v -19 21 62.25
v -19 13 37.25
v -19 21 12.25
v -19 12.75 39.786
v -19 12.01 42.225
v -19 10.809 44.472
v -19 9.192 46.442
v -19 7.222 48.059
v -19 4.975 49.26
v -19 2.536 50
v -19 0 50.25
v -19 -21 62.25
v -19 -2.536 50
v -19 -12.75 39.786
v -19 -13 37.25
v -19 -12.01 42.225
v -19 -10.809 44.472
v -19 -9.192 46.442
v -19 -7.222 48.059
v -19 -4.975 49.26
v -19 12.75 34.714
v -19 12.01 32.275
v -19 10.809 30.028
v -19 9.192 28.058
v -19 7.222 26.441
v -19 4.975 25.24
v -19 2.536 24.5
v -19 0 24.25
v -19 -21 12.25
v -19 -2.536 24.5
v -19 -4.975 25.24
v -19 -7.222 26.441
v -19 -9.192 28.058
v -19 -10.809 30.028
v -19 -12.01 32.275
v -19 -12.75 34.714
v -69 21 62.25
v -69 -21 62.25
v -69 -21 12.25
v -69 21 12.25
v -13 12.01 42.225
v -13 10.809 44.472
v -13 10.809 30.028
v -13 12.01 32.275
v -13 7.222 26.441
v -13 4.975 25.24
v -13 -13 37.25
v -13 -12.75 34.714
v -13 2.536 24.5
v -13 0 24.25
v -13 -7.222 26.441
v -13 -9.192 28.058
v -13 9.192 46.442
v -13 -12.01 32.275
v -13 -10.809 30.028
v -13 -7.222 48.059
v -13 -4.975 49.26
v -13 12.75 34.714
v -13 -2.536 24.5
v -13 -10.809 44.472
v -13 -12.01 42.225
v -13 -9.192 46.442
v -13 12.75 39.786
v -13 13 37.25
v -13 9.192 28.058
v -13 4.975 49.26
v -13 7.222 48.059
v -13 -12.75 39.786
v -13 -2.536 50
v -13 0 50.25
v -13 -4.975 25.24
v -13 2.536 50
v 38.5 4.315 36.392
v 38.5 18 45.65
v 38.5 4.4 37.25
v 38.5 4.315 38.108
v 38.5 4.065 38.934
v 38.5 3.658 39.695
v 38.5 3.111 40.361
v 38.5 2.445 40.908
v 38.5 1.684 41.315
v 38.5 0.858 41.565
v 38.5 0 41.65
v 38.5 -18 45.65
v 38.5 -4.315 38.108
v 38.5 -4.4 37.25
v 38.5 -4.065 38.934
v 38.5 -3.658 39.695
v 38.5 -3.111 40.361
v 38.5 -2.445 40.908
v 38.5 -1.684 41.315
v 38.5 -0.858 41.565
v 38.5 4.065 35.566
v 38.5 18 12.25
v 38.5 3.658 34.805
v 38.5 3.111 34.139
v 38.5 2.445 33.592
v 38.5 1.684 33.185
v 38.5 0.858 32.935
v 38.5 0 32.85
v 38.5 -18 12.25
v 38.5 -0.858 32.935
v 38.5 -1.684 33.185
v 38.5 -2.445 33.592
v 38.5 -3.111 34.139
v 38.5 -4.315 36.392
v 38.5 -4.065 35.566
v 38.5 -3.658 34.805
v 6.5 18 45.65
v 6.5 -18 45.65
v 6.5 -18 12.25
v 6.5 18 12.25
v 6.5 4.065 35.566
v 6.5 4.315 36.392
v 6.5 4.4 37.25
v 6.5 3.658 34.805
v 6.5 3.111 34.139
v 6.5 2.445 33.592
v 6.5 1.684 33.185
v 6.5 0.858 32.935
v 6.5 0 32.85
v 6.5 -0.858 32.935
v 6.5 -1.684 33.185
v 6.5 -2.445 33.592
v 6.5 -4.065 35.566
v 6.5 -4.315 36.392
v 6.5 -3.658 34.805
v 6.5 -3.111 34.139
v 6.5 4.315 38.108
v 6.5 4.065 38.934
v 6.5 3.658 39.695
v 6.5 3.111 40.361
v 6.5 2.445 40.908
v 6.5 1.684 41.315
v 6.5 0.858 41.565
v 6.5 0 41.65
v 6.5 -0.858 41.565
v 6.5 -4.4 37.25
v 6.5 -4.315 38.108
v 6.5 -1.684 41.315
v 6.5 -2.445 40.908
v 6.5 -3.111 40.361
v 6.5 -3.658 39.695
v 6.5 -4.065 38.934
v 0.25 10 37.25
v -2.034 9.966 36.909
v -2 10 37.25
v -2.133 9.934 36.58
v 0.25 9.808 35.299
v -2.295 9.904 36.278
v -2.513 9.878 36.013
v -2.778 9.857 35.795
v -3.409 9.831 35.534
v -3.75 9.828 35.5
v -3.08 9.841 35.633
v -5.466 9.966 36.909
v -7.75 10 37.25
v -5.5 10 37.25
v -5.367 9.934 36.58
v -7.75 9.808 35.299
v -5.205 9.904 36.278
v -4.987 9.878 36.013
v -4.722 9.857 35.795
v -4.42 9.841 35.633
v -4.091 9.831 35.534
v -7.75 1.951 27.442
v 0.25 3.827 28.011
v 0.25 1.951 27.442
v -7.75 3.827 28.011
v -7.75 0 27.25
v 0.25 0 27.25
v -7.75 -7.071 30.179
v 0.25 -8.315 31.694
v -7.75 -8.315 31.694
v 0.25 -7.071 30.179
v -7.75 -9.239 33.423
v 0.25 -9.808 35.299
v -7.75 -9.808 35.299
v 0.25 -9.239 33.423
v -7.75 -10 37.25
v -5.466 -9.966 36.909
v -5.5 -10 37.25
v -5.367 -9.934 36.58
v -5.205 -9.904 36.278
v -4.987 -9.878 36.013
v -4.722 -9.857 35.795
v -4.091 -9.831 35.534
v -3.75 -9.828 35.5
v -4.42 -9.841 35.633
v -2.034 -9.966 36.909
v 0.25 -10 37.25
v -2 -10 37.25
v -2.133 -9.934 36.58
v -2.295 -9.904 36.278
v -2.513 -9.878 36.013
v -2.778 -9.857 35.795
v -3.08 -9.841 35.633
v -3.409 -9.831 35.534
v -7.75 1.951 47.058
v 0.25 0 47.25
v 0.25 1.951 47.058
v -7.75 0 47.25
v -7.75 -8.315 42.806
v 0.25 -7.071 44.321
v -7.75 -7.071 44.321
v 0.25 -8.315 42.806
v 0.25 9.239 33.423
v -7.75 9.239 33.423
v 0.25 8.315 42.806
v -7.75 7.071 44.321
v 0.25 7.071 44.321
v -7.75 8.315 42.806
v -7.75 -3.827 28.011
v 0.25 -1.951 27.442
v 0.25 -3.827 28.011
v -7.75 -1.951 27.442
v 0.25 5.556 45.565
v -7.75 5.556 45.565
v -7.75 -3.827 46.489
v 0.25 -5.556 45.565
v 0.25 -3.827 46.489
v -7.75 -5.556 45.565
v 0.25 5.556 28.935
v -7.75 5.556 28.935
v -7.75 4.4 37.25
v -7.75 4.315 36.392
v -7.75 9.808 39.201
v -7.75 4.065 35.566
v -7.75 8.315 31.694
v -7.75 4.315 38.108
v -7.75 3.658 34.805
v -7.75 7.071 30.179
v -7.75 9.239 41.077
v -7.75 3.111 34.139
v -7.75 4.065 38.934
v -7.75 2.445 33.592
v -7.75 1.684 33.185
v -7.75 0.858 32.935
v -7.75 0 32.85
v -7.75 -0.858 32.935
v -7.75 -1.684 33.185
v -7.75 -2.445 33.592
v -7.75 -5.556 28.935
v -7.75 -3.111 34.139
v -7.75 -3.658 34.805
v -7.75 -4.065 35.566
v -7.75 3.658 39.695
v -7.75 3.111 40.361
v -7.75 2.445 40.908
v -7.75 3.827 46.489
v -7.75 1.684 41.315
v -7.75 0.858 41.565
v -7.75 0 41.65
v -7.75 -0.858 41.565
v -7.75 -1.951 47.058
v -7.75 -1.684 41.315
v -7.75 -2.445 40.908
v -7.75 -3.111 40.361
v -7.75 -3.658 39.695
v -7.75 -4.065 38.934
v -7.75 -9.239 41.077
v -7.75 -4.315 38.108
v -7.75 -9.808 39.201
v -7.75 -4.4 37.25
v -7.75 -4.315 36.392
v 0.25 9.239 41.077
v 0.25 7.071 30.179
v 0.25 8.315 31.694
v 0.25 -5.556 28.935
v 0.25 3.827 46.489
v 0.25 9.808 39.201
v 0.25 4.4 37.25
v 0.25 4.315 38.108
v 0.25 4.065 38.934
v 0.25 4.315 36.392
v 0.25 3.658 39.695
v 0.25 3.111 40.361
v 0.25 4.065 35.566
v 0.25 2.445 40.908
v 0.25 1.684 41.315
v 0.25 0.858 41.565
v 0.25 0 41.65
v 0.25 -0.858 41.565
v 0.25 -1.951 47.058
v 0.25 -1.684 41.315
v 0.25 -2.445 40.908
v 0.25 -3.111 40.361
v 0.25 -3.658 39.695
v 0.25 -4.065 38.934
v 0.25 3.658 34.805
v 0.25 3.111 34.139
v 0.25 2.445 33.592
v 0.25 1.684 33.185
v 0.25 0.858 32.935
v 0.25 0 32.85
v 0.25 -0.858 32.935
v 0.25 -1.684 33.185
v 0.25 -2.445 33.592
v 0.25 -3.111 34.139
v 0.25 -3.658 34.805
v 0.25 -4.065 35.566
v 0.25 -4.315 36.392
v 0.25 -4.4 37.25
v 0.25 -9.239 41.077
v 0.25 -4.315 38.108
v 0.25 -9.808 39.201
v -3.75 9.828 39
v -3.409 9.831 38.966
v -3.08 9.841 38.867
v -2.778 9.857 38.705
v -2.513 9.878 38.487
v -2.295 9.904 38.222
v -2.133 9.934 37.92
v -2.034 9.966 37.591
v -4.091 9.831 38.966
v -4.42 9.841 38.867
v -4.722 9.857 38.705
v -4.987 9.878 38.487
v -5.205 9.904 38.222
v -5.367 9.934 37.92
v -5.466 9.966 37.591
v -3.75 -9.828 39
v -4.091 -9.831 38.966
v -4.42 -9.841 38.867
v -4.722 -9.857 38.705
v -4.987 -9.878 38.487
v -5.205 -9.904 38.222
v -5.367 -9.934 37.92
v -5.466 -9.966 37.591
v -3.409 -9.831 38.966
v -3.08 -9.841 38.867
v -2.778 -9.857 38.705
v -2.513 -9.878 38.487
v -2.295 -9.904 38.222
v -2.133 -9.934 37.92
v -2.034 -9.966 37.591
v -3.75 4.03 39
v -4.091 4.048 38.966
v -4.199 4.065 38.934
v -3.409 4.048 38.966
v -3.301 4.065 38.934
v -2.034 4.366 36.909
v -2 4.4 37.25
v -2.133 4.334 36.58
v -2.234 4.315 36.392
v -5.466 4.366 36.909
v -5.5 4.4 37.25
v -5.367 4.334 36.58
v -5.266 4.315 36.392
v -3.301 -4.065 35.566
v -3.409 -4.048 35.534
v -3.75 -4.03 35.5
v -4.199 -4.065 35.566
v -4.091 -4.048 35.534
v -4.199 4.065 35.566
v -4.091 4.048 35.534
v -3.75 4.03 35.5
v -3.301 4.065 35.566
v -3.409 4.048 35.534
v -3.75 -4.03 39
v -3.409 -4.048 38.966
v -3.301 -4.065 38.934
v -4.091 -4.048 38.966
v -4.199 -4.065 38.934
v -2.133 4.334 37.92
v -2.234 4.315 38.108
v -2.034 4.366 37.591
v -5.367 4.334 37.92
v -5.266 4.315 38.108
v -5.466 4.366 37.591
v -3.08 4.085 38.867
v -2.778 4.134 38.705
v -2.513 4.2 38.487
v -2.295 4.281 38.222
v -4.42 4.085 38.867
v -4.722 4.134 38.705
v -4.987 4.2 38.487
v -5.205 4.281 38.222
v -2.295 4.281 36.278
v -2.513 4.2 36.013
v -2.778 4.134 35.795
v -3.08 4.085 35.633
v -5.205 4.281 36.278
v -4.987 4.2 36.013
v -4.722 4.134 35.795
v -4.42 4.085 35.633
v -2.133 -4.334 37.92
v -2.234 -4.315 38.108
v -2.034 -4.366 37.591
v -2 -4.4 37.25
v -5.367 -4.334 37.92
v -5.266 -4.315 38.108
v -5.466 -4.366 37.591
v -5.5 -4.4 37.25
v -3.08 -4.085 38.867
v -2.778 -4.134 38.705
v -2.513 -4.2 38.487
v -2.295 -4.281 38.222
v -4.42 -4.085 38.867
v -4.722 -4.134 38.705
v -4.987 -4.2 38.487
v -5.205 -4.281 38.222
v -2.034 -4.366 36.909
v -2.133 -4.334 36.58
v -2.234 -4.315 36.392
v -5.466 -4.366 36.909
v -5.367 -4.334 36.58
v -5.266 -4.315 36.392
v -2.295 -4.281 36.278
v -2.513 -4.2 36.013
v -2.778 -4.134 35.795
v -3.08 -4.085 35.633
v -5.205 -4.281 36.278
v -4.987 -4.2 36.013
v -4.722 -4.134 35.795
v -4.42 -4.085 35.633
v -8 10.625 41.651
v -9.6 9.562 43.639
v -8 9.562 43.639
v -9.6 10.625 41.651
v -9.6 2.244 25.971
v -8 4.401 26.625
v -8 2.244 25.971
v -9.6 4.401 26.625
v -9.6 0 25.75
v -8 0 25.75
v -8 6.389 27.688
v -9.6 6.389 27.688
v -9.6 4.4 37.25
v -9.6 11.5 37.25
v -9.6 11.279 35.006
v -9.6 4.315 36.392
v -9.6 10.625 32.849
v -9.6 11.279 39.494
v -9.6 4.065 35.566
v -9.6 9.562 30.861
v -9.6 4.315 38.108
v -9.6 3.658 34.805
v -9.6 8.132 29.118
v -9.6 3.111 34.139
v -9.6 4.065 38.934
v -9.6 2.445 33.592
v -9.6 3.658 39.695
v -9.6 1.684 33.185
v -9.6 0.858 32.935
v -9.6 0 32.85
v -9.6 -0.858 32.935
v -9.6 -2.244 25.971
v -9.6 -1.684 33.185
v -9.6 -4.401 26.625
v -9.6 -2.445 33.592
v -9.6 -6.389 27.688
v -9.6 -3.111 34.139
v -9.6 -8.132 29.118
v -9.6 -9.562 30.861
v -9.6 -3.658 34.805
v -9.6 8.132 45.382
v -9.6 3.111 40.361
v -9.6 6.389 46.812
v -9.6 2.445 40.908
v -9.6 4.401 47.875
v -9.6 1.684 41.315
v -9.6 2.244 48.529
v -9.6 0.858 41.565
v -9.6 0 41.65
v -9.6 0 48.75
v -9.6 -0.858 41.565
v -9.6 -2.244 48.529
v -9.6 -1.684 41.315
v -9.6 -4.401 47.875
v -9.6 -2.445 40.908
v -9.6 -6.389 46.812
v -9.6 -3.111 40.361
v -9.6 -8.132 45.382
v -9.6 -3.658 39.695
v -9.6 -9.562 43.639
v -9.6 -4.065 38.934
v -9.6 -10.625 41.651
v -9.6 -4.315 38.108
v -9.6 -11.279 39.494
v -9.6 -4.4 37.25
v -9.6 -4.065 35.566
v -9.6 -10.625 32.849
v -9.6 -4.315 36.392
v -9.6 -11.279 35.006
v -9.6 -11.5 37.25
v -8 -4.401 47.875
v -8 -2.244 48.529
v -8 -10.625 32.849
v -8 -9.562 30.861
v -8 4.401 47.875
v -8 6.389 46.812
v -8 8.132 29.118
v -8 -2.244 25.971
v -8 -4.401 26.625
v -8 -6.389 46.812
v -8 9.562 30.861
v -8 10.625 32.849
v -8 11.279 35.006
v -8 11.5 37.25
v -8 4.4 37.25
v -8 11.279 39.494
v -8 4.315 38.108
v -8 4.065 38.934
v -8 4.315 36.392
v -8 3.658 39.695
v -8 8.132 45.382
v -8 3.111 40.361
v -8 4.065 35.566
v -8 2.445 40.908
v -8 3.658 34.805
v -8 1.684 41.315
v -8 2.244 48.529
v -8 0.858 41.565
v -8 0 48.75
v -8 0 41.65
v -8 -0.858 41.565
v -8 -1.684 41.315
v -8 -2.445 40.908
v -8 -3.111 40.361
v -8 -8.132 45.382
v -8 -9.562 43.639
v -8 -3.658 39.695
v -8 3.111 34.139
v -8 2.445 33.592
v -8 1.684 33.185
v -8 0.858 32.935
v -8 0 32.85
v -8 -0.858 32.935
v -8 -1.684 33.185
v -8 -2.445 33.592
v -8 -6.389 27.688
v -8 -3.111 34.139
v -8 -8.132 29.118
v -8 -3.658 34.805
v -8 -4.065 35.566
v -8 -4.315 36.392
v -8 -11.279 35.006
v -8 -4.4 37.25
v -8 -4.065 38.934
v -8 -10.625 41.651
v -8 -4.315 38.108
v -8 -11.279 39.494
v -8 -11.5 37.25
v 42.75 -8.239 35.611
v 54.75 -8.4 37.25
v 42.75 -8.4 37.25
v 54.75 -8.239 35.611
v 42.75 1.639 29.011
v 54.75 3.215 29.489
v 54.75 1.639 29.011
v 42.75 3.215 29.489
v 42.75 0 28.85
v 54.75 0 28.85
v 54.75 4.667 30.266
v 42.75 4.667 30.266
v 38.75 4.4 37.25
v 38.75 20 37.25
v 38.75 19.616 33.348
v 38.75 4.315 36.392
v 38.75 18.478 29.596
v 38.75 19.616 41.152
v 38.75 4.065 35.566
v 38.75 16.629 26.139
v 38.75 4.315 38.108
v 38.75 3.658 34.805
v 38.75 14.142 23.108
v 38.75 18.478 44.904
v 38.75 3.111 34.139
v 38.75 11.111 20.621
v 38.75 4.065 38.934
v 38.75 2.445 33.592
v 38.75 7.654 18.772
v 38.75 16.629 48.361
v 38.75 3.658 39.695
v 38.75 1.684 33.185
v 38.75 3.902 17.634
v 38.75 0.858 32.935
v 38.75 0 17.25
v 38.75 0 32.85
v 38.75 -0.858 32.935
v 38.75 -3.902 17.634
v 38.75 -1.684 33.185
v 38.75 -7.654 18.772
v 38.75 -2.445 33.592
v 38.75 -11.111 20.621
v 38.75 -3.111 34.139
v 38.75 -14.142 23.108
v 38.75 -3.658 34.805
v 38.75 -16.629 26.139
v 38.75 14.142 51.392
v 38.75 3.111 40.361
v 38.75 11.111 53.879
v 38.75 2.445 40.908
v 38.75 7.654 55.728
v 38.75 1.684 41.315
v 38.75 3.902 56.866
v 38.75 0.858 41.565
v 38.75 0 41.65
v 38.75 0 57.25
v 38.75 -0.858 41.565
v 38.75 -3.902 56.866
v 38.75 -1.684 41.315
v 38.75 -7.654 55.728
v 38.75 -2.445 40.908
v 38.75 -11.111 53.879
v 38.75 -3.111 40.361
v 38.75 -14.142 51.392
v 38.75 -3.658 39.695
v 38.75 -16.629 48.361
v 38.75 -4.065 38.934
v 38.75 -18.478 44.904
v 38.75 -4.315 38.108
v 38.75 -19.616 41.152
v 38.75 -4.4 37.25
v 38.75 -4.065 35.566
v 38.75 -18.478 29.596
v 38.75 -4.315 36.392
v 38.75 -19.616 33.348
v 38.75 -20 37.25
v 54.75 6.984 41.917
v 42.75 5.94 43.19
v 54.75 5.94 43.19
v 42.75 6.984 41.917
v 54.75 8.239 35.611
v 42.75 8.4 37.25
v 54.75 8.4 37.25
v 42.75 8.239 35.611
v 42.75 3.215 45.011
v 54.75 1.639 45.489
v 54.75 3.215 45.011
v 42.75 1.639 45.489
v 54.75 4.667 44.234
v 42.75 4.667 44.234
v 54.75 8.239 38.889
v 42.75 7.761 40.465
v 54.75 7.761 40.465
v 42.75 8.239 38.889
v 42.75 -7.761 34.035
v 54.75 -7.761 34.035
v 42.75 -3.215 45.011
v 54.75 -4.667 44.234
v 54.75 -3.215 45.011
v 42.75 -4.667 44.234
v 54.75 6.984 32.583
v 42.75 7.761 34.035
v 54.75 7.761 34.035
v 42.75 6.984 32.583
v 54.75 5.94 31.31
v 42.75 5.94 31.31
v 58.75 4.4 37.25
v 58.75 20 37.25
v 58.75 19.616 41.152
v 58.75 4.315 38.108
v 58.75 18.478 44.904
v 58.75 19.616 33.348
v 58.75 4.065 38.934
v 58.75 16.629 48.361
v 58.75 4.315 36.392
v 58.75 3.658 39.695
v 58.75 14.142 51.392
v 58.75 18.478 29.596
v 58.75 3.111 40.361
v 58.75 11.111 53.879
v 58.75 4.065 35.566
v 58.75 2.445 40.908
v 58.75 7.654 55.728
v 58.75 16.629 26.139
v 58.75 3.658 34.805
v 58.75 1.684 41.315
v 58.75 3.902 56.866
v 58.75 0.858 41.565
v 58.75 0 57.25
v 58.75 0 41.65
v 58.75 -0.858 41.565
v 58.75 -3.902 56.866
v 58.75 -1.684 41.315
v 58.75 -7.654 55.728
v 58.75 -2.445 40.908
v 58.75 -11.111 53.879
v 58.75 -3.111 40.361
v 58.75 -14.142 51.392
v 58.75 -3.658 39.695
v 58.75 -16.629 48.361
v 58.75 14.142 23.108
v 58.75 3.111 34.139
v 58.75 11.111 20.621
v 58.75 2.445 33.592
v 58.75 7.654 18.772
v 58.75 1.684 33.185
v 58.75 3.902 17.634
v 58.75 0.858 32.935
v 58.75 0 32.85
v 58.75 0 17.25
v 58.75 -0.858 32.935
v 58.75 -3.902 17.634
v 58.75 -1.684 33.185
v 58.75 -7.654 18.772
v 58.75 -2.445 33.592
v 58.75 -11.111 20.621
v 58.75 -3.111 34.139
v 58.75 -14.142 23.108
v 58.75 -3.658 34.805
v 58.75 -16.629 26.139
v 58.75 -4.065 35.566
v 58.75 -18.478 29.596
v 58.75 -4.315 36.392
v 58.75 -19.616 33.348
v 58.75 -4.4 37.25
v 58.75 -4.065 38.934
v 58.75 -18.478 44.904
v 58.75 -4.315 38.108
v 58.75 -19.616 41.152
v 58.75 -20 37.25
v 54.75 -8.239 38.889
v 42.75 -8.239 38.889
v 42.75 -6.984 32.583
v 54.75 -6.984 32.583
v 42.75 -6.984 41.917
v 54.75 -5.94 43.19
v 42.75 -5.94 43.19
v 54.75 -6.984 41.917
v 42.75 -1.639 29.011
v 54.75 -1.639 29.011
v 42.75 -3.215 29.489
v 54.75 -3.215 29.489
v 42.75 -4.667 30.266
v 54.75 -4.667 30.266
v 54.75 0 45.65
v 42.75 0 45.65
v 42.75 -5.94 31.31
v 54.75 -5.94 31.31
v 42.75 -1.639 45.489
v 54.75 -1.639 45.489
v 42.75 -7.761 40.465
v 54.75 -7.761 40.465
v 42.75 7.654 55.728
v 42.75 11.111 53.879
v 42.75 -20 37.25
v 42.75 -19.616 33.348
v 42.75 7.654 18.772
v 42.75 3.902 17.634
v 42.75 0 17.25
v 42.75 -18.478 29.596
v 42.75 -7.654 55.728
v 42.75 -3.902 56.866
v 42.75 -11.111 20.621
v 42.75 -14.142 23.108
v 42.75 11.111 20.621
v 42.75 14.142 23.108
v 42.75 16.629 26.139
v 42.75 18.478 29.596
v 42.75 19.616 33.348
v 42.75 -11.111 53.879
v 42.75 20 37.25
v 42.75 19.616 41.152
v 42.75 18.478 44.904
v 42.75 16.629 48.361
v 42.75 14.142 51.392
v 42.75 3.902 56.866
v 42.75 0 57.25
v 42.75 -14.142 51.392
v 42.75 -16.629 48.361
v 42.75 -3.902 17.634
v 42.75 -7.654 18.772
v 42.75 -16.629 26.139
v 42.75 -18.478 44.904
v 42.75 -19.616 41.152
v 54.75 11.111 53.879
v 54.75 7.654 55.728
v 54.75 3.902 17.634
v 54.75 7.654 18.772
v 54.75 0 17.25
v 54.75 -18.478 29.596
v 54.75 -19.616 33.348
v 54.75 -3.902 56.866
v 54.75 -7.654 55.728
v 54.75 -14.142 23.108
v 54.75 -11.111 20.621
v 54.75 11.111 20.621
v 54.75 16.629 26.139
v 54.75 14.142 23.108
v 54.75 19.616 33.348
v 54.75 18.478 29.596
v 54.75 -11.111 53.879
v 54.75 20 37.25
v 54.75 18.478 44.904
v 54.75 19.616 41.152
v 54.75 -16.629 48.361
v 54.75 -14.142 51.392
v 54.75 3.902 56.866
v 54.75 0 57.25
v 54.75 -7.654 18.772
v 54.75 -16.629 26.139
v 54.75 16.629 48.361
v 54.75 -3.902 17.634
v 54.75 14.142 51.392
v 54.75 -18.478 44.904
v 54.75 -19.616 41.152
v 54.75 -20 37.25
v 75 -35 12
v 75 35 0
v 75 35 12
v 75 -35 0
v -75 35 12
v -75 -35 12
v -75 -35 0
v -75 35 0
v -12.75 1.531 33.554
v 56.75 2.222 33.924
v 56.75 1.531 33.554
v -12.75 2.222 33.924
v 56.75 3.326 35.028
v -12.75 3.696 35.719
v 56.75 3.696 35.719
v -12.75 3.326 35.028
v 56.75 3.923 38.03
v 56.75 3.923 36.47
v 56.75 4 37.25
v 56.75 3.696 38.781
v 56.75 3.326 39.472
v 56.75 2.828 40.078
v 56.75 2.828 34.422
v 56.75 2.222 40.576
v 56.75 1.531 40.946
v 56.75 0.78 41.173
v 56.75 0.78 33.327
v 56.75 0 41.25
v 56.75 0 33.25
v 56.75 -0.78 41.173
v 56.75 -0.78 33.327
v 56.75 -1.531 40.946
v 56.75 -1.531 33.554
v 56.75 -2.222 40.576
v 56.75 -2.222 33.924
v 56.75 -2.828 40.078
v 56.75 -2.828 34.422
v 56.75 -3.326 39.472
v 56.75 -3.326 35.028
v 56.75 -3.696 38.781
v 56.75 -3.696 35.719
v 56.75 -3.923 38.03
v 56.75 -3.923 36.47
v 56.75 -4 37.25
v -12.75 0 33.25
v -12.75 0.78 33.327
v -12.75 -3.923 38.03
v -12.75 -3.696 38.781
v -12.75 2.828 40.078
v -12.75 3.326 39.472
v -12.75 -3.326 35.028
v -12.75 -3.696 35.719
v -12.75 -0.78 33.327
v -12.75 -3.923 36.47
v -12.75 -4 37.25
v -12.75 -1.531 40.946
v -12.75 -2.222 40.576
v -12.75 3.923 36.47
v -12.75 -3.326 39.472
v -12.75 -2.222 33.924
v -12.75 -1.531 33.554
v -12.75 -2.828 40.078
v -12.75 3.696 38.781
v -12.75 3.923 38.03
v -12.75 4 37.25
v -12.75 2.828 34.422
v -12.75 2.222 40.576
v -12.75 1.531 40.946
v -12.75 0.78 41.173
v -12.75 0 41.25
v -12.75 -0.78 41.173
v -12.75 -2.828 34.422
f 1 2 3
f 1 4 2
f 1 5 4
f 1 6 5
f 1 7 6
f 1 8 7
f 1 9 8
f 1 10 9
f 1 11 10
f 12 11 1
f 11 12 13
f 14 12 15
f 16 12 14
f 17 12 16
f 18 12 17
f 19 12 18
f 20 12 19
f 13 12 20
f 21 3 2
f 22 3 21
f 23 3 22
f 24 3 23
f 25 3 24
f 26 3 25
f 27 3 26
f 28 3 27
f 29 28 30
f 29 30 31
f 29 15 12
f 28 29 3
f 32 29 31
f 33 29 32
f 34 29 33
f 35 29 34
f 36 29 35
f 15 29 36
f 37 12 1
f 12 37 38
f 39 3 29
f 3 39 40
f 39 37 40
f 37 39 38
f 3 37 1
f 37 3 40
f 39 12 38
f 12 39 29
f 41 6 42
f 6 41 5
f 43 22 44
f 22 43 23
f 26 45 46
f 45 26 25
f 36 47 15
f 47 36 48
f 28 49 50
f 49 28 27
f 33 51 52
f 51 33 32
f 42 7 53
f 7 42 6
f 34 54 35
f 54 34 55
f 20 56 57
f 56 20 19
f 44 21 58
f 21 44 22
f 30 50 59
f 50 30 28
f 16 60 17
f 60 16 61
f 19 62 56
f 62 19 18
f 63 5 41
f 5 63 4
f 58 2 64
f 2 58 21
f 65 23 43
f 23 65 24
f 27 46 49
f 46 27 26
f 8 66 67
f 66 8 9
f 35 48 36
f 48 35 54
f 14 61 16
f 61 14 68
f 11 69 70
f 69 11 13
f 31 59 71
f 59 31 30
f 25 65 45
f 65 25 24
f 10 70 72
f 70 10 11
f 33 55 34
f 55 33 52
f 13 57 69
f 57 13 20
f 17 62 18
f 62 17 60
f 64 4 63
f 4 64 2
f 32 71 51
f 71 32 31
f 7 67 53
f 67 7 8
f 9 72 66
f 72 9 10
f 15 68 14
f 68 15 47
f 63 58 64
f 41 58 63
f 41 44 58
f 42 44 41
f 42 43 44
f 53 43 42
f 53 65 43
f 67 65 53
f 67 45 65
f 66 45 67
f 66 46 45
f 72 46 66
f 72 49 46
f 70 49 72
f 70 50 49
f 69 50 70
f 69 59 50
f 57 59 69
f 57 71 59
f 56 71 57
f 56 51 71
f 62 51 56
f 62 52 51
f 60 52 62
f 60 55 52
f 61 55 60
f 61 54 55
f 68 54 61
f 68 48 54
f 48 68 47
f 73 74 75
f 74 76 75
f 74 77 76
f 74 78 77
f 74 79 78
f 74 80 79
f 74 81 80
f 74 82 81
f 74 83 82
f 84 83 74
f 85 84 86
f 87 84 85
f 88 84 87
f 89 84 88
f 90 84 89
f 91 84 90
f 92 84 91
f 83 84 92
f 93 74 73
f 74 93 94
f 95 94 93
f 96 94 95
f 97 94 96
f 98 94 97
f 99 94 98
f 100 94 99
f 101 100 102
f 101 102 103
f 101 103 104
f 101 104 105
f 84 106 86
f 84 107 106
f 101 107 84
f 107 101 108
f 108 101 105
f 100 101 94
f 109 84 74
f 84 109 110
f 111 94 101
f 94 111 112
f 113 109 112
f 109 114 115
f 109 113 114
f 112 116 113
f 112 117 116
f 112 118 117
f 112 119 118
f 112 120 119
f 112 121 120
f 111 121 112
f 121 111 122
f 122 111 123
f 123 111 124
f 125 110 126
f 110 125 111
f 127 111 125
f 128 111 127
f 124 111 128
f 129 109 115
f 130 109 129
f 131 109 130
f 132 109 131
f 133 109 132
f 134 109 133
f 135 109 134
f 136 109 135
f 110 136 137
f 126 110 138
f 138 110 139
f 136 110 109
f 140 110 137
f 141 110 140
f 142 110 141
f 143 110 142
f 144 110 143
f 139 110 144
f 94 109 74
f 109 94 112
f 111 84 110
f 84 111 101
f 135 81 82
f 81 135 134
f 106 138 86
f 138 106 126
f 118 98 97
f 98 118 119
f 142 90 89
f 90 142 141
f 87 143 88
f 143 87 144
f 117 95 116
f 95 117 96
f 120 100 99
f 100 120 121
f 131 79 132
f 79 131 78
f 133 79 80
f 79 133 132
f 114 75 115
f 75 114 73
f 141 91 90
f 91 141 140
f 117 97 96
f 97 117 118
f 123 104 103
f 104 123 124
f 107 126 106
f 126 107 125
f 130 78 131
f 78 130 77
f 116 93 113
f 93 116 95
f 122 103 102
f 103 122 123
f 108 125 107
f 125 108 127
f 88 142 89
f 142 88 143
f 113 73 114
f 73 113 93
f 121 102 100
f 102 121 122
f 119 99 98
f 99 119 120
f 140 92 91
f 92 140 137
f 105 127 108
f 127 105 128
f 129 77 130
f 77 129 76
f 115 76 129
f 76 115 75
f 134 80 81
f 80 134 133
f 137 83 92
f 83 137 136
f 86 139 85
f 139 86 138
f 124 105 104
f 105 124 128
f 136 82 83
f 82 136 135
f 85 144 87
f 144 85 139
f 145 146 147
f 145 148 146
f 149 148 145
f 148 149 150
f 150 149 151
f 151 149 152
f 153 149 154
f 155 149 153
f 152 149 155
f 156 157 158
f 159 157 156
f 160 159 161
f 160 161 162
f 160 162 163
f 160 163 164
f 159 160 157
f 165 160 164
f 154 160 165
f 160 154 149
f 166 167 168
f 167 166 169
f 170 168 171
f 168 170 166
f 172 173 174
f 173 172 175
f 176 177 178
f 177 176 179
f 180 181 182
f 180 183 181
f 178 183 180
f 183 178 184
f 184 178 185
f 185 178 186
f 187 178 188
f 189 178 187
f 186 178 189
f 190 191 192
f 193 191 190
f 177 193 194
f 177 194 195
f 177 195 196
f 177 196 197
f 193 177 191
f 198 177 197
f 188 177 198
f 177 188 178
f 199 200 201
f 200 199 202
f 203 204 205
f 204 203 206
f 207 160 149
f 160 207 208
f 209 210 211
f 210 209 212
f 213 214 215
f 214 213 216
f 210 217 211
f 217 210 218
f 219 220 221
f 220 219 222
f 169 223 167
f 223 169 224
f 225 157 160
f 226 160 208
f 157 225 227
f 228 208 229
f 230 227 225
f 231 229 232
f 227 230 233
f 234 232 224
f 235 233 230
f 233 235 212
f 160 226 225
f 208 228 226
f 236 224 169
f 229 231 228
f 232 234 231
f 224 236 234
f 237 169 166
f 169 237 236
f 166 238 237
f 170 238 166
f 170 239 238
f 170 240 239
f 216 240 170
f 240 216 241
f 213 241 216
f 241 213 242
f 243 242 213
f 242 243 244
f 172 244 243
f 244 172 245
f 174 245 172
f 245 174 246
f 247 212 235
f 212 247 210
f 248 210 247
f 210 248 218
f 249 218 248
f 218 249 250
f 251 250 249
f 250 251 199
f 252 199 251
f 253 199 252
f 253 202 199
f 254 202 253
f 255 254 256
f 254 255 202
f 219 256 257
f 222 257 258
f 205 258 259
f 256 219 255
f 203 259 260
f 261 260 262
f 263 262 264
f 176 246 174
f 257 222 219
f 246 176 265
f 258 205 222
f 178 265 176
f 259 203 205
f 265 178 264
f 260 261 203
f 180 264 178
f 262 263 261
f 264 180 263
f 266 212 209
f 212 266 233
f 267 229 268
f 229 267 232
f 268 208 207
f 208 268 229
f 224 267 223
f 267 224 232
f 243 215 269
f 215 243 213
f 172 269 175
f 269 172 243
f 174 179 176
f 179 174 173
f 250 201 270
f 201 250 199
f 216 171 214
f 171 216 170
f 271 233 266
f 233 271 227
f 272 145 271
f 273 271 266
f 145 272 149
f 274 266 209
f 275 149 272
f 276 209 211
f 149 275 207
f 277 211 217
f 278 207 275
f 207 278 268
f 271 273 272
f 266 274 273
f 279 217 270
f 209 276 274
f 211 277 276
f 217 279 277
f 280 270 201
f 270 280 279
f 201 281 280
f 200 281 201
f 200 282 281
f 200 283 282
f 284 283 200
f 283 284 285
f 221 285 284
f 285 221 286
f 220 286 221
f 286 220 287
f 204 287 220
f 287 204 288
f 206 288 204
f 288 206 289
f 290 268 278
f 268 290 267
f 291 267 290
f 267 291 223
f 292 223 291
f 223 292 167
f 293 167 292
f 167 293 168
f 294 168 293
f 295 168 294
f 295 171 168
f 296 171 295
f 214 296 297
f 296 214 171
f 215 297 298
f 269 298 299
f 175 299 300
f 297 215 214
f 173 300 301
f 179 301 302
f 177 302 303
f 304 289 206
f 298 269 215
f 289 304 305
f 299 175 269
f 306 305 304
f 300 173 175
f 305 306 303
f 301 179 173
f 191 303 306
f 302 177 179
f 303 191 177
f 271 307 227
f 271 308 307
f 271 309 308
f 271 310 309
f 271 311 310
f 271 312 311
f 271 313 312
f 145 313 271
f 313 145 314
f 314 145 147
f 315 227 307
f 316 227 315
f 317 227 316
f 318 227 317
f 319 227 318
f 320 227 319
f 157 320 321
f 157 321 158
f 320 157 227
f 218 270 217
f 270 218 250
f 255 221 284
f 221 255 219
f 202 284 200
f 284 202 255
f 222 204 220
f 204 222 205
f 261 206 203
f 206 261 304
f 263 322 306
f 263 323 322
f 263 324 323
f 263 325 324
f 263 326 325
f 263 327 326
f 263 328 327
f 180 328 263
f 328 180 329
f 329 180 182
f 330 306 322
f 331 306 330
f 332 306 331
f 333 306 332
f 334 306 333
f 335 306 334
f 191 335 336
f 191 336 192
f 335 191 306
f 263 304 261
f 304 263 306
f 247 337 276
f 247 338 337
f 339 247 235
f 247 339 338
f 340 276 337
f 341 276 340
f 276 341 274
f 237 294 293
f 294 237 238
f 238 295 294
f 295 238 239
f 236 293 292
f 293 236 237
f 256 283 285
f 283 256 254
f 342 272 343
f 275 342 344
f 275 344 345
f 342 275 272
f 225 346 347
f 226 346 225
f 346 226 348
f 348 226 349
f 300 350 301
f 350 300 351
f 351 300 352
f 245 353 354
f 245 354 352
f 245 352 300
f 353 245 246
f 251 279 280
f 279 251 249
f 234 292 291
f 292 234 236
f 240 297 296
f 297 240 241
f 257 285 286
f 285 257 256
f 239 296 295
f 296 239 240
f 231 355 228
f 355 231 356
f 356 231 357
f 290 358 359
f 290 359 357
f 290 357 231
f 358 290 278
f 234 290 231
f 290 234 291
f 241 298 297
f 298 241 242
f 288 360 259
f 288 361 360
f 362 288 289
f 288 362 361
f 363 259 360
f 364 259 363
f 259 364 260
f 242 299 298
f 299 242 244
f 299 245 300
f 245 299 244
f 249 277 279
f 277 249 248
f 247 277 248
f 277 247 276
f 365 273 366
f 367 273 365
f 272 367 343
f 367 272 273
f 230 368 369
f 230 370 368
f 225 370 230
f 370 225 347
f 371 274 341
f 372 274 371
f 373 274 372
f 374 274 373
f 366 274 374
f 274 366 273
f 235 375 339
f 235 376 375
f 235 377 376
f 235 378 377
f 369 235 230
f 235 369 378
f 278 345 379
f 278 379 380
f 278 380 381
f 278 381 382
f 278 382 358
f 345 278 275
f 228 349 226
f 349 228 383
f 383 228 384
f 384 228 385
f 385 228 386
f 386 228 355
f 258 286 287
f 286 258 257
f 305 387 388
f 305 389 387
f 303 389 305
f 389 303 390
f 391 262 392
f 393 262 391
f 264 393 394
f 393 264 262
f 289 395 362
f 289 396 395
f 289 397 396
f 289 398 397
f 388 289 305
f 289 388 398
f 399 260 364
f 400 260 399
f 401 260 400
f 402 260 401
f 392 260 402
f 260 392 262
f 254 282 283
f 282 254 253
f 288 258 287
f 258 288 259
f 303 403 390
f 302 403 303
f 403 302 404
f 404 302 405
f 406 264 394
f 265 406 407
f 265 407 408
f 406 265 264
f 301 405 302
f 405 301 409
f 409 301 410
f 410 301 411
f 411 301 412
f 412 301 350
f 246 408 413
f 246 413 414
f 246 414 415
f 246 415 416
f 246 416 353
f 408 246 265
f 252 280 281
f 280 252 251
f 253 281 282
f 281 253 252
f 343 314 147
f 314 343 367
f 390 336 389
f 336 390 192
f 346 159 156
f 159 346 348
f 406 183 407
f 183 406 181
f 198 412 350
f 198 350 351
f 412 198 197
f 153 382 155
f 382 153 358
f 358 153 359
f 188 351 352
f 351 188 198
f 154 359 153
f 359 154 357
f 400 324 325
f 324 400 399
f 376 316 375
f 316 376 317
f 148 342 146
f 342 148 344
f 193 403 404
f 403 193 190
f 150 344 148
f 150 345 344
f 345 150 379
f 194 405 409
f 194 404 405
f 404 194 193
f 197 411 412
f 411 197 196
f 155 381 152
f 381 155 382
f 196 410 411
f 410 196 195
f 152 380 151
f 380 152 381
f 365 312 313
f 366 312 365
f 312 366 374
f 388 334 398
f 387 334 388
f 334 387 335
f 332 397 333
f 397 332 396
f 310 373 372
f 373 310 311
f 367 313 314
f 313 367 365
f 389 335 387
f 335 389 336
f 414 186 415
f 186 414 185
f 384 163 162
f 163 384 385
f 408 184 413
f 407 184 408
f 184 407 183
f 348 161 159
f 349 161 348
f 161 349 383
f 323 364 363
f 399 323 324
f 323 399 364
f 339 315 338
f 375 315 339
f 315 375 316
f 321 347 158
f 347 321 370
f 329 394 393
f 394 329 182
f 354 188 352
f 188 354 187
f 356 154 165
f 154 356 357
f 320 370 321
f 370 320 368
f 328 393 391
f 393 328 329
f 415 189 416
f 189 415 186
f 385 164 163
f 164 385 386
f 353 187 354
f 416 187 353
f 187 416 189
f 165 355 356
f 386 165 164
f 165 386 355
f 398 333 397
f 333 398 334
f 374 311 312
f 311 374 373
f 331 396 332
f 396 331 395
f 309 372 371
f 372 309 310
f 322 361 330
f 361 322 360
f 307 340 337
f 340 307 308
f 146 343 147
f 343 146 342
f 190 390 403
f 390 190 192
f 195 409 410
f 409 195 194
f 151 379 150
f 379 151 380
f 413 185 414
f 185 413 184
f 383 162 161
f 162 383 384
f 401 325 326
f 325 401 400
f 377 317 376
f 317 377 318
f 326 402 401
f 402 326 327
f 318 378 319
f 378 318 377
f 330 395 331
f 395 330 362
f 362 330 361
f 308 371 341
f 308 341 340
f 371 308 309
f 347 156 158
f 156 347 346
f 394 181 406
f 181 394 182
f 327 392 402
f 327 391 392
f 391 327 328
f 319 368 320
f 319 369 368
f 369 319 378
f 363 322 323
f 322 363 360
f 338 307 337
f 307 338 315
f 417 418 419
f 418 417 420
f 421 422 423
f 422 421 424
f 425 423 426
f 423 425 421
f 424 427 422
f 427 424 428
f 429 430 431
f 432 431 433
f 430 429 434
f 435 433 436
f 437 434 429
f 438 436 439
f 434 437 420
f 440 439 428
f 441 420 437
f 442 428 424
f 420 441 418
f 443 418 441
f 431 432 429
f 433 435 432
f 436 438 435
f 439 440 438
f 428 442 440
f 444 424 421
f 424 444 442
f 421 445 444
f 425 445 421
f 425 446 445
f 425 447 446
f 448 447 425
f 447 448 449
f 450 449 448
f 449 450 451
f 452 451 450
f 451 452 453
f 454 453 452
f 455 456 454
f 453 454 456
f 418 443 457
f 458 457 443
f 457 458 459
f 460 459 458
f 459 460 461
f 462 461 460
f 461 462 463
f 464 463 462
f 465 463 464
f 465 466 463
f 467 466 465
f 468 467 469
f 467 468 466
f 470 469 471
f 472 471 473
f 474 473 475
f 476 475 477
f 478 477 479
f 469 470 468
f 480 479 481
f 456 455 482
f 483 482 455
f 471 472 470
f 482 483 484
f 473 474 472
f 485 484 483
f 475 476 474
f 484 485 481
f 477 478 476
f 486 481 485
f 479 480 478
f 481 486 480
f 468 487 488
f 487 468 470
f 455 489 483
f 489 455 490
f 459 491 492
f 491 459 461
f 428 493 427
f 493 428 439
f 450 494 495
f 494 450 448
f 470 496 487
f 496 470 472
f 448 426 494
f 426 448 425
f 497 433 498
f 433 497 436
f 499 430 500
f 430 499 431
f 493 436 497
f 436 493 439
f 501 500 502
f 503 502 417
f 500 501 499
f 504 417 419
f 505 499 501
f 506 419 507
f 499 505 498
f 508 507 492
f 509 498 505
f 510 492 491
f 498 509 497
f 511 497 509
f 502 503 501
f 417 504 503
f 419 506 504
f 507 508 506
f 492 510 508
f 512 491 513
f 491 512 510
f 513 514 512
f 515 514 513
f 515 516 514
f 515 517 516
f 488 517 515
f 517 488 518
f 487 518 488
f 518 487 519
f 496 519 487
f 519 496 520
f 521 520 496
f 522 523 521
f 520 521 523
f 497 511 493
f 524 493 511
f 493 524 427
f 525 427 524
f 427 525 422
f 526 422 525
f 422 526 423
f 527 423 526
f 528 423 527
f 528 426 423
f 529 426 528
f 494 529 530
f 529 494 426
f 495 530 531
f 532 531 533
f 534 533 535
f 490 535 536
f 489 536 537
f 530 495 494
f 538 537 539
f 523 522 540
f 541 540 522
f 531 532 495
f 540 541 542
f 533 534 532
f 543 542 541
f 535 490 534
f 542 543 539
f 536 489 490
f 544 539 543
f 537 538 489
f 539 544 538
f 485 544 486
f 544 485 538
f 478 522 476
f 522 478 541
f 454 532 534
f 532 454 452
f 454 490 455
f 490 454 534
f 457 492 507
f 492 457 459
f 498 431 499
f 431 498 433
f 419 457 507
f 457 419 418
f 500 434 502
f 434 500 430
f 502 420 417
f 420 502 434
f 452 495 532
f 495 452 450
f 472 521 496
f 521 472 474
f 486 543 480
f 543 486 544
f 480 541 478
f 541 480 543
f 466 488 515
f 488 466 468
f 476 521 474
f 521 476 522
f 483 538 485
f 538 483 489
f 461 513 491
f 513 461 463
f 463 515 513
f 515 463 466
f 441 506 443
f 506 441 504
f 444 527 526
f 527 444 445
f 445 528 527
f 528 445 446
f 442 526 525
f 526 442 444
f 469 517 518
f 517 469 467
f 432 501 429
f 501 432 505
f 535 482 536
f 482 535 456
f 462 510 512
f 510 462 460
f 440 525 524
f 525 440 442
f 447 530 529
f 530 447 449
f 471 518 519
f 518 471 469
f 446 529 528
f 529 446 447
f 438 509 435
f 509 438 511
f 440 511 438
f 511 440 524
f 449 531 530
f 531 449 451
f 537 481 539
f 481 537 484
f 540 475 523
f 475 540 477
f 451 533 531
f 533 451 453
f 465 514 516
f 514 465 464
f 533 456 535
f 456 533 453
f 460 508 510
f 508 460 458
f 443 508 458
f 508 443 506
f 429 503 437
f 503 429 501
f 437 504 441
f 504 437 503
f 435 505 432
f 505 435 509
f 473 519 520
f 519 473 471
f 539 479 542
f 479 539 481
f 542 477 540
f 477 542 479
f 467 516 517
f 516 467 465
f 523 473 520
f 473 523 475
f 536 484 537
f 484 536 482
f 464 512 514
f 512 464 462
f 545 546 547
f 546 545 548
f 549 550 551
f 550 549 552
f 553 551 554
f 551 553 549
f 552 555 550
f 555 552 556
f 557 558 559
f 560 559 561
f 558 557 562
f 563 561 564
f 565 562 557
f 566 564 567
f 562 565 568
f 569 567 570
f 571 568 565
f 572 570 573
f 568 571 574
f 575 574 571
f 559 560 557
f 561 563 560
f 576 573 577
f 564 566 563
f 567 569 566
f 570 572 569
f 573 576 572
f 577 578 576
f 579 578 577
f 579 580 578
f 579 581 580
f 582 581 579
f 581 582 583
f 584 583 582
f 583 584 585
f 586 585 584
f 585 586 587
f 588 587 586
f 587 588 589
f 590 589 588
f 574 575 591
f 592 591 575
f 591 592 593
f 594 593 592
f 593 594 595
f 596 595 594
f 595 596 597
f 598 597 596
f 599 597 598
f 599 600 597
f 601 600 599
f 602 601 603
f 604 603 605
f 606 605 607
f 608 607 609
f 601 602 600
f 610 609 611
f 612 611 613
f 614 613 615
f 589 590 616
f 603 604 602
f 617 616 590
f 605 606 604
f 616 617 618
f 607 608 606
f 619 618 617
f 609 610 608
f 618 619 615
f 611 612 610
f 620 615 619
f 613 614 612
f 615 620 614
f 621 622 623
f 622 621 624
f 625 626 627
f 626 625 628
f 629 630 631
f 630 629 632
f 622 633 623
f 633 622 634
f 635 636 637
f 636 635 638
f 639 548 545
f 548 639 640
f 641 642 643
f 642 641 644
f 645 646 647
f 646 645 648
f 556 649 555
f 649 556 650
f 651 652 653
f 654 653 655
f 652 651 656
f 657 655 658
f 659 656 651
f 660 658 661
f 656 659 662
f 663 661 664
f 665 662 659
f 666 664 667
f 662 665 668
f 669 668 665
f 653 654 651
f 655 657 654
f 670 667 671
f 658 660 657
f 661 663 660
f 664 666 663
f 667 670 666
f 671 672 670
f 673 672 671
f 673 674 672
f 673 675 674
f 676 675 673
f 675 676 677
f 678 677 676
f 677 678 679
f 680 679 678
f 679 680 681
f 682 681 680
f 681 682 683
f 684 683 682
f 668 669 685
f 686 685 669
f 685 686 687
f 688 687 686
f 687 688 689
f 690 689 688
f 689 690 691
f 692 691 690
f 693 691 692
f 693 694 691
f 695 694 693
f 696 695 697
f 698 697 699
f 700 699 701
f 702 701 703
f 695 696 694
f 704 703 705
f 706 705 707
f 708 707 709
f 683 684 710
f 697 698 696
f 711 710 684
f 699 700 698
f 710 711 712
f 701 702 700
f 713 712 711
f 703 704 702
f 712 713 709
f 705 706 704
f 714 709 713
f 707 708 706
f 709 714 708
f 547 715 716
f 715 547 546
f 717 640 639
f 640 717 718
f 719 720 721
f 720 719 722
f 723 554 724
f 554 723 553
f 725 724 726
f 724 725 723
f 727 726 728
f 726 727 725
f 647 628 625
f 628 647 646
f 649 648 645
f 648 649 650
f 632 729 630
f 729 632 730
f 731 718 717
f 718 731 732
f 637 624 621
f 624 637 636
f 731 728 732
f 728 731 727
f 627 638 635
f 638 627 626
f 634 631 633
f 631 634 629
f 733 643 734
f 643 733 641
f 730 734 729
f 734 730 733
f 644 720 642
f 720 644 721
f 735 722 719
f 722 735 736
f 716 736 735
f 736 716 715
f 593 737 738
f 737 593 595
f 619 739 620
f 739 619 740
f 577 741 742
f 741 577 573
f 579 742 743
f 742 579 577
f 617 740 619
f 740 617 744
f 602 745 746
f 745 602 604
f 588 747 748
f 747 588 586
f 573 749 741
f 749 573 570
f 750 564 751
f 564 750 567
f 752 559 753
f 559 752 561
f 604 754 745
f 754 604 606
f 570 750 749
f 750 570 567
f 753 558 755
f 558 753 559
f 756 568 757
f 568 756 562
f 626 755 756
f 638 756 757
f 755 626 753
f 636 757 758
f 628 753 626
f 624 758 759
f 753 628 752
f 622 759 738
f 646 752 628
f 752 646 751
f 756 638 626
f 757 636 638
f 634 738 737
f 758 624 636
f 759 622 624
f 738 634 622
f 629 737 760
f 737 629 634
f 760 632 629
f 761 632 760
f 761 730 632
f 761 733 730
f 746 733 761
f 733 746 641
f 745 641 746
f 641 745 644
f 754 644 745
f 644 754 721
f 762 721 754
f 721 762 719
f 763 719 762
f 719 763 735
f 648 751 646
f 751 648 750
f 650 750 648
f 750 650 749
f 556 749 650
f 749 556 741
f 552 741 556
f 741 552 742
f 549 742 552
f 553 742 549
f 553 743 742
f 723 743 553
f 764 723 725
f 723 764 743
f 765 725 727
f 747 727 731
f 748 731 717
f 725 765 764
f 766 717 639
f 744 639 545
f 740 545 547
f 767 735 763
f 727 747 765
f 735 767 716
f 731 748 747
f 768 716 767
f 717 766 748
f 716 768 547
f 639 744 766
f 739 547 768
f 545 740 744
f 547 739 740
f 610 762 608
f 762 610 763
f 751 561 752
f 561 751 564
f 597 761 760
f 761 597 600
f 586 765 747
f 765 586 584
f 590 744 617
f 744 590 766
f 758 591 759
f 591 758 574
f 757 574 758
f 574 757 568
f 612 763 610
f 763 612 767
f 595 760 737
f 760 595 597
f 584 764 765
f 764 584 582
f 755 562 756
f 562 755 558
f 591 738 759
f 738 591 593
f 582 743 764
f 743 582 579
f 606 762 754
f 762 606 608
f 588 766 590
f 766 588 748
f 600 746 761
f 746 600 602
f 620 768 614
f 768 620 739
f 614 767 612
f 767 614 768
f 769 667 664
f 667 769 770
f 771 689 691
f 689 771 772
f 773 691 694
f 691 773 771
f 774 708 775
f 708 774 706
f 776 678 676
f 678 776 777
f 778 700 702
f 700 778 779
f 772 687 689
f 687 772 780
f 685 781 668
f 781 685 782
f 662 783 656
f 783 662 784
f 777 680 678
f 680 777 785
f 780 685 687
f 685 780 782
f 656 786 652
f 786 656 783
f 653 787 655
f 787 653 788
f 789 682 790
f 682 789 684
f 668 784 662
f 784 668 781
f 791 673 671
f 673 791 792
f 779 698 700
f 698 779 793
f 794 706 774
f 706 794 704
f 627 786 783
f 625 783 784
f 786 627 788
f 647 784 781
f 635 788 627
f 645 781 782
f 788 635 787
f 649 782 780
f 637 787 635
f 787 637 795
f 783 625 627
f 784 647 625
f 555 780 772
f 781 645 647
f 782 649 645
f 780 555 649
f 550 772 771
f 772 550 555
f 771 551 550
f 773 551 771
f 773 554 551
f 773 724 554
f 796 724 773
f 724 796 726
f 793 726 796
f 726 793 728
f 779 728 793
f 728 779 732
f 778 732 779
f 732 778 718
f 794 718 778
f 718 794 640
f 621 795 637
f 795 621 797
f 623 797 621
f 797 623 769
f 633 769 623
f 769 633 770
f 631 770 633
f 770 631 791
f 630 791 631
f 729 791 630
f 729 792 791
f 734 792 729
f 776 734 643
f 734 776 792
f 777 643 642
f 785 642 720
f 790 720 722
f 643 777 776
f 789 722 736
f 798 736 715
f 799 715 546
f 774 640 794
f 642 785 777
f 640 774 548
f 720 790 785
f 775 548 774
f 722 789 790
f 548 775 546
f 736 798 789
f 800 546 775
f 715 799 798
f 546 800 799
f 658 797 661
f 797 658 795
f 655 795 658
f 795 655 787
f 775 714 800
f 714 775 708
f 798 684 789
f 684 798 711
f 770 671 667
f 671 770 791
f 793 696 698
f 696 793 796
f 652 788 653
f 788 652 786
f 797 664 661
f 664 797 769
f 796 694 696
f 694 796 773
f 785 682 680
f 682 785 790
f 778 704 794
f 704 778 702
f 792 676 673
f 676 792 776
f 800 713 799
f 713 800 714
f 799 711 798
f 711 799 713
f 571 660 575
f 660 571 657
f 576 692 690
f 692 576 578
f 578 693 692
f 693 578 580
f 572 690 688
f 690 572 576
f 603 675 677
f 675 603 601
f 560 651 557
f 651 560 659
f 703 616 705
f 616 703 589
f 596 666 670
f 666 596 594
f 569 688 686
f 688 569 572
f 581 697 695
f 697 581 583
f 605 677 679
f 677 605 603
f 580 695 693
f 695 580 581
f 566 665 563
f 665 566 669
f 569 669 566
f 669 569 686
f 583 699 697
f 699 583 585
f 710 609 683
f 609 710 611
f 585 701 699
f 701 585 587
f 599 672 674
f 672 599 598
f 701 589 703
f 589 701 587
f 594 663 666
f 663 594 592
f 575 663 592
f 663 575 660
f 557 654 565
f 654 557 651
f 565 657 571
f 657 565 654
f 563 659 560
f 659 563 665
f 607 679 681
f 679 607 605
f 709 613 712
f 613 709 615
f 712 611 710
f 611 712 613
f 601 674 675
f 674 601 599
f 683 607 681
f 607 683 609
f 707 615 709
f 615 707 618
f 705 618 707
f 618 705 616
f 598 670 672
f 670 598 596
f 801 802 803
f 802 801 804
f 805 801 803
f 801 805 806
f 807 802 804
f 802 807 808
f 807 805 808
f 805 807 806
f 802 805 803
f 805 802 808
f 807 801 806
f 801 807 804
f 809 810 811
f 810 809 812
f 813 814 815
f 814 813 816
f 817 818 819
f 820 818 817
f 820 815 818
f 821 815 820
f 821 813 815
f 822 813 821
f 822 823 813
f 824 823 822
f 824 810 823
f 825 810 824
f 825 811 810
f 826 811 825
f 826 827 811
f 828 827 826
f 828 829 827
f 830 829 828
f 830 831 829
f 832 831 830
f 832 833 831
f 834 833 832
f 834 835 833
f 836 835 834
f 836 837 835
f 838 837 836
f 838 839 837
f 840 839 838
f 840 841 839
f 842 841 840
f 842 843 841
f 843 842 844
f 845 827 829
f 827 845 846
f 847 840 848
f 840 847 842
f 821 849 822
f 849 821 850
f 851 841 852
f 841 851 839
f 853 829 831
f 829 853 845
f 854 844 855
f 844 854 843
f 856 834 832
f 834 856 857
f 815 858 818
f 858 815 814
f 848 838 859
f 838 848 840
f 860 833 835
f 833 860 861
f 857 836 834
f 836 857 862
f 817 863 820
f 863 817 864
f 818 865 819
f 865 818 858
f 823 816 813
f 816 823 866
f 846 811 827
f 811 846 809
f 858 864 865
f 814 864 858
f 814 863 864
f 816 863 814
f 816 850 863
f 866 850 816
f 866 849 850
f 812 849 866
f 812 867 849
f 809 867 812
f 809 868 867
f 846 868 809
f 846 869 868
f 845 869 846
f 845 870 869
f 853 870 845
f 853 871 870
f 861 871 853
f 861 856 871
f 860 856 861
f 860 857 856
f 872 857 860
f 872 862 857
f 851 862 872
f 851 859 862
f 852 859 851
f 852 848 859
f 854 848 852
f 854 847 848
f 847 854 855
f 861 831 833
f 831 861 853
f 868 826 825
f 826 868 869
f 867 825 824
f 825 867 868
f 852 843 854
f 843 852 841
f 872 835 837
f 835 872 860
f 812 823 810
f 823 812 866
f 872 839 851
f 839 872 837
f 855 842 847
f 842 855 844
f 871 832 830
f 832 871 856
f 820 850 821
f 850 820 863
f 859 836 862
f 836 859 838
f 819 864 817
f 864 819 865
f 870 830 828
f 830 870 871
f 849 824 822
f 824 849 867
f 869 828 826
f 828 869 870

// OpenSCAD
$fn = 32;

// ------------------------------------------------------------------------
// Motor drive station: motor 50 x 50 mm, shaft d8, pulley d40
// Every part is its own module, assembly() places every instance.
// ------------------------------------------------------------------------

// --- part 1 ---
module station_bed() {
  difference() {
    translate([-75, -35, 0]) cube([150, 70, 12]);
  }
}

// --- part 2 ---
module drive_motor() {
  union() {
    translate([-25, -21, 0]) cube([50, 42, 50]);
    translate([28, 0, 25]) rotate([0, 90, 0]) cylinder(h = 6, d = 26, center = true);
  }
}

// --- part 3 ---
module pillow_block() {
  difference() {
    translate([-16, -18, 0]) cube([32, 36, 33.4]);
    translate([0, 0, 25]) rotate([0, 90, 0]) cylinder(h = 34, d = 8.8, center = true);
  }
}

// --- part 4 ---
module drive_shaft() {
  translate([0, 0, -34.75]) cylinder(h = 69.5, d = 8);
}

// --- part 5 ---
module shaft_collar() {
  difference() {
    cylinder(h = 8, d = 20);
    translate([0, 0, -1]) cylinder(h = 10, d = 8.8);
    translate([0, 0, 4]) rotate([90, 0, 0]) cylinder(h = 22, d = 3.5, center = true);
  }
}

// --- part 6 ---
module collar_washer() {
  difference() {
      translate([0, 0, 0]) cylinder(h = 1.6, d = 23);
      translate([0, 0, -1]) cylinder(h = 3.6, d = 8.8);
    }
}

// --- part 7 ---
module drive_pulley() {
  difference() {
    union() {
      cylinder(h = 20, d = 16.8);
      cylinder(h = 4, d = 40);
      translate([0, 0, 16]) cylinder(h = 4, d = 40);
    }
    translate([0, 0, -1]) cylinder(h = 22, d = 8.8);
  }
}

// --- assembly ---
module assembly() {
  color([0.80, 0.24, 0.20]) translate([0, 0, 0]) rotate([0, 0, 0]) station_bed();
  color([0.20, 0.45, 0.75]) translate([-44, 0, 12.25]) rotate([0, 0, 0]) drive_motor();
  color([0.25, 0.62, 0.32]) translate([22.5, 0, 12.25]) rotate([0, 0, 0]) pillow_block();
  color([0.92, 0.70, 0.18]) translate([22, 0, 37.25]) rotate([0, 90, 0]) drive_shaft();
  color([0.58, 0.35, 0.70]) translate([-7.75, 0, 37.25]) rotate([0, 90, 0]) shaft_collar();
  color([0.16, 0.66, 0.66]) translate([-9.6, 0, 37.25]) rotate([0, 90, 0]) collar_washer();
  color([0.85, 0.48, 0.18]) translate([38.75, 0, 37.25]) rotate([0, 90, 0]) drive_pulley();
}

assembly();
